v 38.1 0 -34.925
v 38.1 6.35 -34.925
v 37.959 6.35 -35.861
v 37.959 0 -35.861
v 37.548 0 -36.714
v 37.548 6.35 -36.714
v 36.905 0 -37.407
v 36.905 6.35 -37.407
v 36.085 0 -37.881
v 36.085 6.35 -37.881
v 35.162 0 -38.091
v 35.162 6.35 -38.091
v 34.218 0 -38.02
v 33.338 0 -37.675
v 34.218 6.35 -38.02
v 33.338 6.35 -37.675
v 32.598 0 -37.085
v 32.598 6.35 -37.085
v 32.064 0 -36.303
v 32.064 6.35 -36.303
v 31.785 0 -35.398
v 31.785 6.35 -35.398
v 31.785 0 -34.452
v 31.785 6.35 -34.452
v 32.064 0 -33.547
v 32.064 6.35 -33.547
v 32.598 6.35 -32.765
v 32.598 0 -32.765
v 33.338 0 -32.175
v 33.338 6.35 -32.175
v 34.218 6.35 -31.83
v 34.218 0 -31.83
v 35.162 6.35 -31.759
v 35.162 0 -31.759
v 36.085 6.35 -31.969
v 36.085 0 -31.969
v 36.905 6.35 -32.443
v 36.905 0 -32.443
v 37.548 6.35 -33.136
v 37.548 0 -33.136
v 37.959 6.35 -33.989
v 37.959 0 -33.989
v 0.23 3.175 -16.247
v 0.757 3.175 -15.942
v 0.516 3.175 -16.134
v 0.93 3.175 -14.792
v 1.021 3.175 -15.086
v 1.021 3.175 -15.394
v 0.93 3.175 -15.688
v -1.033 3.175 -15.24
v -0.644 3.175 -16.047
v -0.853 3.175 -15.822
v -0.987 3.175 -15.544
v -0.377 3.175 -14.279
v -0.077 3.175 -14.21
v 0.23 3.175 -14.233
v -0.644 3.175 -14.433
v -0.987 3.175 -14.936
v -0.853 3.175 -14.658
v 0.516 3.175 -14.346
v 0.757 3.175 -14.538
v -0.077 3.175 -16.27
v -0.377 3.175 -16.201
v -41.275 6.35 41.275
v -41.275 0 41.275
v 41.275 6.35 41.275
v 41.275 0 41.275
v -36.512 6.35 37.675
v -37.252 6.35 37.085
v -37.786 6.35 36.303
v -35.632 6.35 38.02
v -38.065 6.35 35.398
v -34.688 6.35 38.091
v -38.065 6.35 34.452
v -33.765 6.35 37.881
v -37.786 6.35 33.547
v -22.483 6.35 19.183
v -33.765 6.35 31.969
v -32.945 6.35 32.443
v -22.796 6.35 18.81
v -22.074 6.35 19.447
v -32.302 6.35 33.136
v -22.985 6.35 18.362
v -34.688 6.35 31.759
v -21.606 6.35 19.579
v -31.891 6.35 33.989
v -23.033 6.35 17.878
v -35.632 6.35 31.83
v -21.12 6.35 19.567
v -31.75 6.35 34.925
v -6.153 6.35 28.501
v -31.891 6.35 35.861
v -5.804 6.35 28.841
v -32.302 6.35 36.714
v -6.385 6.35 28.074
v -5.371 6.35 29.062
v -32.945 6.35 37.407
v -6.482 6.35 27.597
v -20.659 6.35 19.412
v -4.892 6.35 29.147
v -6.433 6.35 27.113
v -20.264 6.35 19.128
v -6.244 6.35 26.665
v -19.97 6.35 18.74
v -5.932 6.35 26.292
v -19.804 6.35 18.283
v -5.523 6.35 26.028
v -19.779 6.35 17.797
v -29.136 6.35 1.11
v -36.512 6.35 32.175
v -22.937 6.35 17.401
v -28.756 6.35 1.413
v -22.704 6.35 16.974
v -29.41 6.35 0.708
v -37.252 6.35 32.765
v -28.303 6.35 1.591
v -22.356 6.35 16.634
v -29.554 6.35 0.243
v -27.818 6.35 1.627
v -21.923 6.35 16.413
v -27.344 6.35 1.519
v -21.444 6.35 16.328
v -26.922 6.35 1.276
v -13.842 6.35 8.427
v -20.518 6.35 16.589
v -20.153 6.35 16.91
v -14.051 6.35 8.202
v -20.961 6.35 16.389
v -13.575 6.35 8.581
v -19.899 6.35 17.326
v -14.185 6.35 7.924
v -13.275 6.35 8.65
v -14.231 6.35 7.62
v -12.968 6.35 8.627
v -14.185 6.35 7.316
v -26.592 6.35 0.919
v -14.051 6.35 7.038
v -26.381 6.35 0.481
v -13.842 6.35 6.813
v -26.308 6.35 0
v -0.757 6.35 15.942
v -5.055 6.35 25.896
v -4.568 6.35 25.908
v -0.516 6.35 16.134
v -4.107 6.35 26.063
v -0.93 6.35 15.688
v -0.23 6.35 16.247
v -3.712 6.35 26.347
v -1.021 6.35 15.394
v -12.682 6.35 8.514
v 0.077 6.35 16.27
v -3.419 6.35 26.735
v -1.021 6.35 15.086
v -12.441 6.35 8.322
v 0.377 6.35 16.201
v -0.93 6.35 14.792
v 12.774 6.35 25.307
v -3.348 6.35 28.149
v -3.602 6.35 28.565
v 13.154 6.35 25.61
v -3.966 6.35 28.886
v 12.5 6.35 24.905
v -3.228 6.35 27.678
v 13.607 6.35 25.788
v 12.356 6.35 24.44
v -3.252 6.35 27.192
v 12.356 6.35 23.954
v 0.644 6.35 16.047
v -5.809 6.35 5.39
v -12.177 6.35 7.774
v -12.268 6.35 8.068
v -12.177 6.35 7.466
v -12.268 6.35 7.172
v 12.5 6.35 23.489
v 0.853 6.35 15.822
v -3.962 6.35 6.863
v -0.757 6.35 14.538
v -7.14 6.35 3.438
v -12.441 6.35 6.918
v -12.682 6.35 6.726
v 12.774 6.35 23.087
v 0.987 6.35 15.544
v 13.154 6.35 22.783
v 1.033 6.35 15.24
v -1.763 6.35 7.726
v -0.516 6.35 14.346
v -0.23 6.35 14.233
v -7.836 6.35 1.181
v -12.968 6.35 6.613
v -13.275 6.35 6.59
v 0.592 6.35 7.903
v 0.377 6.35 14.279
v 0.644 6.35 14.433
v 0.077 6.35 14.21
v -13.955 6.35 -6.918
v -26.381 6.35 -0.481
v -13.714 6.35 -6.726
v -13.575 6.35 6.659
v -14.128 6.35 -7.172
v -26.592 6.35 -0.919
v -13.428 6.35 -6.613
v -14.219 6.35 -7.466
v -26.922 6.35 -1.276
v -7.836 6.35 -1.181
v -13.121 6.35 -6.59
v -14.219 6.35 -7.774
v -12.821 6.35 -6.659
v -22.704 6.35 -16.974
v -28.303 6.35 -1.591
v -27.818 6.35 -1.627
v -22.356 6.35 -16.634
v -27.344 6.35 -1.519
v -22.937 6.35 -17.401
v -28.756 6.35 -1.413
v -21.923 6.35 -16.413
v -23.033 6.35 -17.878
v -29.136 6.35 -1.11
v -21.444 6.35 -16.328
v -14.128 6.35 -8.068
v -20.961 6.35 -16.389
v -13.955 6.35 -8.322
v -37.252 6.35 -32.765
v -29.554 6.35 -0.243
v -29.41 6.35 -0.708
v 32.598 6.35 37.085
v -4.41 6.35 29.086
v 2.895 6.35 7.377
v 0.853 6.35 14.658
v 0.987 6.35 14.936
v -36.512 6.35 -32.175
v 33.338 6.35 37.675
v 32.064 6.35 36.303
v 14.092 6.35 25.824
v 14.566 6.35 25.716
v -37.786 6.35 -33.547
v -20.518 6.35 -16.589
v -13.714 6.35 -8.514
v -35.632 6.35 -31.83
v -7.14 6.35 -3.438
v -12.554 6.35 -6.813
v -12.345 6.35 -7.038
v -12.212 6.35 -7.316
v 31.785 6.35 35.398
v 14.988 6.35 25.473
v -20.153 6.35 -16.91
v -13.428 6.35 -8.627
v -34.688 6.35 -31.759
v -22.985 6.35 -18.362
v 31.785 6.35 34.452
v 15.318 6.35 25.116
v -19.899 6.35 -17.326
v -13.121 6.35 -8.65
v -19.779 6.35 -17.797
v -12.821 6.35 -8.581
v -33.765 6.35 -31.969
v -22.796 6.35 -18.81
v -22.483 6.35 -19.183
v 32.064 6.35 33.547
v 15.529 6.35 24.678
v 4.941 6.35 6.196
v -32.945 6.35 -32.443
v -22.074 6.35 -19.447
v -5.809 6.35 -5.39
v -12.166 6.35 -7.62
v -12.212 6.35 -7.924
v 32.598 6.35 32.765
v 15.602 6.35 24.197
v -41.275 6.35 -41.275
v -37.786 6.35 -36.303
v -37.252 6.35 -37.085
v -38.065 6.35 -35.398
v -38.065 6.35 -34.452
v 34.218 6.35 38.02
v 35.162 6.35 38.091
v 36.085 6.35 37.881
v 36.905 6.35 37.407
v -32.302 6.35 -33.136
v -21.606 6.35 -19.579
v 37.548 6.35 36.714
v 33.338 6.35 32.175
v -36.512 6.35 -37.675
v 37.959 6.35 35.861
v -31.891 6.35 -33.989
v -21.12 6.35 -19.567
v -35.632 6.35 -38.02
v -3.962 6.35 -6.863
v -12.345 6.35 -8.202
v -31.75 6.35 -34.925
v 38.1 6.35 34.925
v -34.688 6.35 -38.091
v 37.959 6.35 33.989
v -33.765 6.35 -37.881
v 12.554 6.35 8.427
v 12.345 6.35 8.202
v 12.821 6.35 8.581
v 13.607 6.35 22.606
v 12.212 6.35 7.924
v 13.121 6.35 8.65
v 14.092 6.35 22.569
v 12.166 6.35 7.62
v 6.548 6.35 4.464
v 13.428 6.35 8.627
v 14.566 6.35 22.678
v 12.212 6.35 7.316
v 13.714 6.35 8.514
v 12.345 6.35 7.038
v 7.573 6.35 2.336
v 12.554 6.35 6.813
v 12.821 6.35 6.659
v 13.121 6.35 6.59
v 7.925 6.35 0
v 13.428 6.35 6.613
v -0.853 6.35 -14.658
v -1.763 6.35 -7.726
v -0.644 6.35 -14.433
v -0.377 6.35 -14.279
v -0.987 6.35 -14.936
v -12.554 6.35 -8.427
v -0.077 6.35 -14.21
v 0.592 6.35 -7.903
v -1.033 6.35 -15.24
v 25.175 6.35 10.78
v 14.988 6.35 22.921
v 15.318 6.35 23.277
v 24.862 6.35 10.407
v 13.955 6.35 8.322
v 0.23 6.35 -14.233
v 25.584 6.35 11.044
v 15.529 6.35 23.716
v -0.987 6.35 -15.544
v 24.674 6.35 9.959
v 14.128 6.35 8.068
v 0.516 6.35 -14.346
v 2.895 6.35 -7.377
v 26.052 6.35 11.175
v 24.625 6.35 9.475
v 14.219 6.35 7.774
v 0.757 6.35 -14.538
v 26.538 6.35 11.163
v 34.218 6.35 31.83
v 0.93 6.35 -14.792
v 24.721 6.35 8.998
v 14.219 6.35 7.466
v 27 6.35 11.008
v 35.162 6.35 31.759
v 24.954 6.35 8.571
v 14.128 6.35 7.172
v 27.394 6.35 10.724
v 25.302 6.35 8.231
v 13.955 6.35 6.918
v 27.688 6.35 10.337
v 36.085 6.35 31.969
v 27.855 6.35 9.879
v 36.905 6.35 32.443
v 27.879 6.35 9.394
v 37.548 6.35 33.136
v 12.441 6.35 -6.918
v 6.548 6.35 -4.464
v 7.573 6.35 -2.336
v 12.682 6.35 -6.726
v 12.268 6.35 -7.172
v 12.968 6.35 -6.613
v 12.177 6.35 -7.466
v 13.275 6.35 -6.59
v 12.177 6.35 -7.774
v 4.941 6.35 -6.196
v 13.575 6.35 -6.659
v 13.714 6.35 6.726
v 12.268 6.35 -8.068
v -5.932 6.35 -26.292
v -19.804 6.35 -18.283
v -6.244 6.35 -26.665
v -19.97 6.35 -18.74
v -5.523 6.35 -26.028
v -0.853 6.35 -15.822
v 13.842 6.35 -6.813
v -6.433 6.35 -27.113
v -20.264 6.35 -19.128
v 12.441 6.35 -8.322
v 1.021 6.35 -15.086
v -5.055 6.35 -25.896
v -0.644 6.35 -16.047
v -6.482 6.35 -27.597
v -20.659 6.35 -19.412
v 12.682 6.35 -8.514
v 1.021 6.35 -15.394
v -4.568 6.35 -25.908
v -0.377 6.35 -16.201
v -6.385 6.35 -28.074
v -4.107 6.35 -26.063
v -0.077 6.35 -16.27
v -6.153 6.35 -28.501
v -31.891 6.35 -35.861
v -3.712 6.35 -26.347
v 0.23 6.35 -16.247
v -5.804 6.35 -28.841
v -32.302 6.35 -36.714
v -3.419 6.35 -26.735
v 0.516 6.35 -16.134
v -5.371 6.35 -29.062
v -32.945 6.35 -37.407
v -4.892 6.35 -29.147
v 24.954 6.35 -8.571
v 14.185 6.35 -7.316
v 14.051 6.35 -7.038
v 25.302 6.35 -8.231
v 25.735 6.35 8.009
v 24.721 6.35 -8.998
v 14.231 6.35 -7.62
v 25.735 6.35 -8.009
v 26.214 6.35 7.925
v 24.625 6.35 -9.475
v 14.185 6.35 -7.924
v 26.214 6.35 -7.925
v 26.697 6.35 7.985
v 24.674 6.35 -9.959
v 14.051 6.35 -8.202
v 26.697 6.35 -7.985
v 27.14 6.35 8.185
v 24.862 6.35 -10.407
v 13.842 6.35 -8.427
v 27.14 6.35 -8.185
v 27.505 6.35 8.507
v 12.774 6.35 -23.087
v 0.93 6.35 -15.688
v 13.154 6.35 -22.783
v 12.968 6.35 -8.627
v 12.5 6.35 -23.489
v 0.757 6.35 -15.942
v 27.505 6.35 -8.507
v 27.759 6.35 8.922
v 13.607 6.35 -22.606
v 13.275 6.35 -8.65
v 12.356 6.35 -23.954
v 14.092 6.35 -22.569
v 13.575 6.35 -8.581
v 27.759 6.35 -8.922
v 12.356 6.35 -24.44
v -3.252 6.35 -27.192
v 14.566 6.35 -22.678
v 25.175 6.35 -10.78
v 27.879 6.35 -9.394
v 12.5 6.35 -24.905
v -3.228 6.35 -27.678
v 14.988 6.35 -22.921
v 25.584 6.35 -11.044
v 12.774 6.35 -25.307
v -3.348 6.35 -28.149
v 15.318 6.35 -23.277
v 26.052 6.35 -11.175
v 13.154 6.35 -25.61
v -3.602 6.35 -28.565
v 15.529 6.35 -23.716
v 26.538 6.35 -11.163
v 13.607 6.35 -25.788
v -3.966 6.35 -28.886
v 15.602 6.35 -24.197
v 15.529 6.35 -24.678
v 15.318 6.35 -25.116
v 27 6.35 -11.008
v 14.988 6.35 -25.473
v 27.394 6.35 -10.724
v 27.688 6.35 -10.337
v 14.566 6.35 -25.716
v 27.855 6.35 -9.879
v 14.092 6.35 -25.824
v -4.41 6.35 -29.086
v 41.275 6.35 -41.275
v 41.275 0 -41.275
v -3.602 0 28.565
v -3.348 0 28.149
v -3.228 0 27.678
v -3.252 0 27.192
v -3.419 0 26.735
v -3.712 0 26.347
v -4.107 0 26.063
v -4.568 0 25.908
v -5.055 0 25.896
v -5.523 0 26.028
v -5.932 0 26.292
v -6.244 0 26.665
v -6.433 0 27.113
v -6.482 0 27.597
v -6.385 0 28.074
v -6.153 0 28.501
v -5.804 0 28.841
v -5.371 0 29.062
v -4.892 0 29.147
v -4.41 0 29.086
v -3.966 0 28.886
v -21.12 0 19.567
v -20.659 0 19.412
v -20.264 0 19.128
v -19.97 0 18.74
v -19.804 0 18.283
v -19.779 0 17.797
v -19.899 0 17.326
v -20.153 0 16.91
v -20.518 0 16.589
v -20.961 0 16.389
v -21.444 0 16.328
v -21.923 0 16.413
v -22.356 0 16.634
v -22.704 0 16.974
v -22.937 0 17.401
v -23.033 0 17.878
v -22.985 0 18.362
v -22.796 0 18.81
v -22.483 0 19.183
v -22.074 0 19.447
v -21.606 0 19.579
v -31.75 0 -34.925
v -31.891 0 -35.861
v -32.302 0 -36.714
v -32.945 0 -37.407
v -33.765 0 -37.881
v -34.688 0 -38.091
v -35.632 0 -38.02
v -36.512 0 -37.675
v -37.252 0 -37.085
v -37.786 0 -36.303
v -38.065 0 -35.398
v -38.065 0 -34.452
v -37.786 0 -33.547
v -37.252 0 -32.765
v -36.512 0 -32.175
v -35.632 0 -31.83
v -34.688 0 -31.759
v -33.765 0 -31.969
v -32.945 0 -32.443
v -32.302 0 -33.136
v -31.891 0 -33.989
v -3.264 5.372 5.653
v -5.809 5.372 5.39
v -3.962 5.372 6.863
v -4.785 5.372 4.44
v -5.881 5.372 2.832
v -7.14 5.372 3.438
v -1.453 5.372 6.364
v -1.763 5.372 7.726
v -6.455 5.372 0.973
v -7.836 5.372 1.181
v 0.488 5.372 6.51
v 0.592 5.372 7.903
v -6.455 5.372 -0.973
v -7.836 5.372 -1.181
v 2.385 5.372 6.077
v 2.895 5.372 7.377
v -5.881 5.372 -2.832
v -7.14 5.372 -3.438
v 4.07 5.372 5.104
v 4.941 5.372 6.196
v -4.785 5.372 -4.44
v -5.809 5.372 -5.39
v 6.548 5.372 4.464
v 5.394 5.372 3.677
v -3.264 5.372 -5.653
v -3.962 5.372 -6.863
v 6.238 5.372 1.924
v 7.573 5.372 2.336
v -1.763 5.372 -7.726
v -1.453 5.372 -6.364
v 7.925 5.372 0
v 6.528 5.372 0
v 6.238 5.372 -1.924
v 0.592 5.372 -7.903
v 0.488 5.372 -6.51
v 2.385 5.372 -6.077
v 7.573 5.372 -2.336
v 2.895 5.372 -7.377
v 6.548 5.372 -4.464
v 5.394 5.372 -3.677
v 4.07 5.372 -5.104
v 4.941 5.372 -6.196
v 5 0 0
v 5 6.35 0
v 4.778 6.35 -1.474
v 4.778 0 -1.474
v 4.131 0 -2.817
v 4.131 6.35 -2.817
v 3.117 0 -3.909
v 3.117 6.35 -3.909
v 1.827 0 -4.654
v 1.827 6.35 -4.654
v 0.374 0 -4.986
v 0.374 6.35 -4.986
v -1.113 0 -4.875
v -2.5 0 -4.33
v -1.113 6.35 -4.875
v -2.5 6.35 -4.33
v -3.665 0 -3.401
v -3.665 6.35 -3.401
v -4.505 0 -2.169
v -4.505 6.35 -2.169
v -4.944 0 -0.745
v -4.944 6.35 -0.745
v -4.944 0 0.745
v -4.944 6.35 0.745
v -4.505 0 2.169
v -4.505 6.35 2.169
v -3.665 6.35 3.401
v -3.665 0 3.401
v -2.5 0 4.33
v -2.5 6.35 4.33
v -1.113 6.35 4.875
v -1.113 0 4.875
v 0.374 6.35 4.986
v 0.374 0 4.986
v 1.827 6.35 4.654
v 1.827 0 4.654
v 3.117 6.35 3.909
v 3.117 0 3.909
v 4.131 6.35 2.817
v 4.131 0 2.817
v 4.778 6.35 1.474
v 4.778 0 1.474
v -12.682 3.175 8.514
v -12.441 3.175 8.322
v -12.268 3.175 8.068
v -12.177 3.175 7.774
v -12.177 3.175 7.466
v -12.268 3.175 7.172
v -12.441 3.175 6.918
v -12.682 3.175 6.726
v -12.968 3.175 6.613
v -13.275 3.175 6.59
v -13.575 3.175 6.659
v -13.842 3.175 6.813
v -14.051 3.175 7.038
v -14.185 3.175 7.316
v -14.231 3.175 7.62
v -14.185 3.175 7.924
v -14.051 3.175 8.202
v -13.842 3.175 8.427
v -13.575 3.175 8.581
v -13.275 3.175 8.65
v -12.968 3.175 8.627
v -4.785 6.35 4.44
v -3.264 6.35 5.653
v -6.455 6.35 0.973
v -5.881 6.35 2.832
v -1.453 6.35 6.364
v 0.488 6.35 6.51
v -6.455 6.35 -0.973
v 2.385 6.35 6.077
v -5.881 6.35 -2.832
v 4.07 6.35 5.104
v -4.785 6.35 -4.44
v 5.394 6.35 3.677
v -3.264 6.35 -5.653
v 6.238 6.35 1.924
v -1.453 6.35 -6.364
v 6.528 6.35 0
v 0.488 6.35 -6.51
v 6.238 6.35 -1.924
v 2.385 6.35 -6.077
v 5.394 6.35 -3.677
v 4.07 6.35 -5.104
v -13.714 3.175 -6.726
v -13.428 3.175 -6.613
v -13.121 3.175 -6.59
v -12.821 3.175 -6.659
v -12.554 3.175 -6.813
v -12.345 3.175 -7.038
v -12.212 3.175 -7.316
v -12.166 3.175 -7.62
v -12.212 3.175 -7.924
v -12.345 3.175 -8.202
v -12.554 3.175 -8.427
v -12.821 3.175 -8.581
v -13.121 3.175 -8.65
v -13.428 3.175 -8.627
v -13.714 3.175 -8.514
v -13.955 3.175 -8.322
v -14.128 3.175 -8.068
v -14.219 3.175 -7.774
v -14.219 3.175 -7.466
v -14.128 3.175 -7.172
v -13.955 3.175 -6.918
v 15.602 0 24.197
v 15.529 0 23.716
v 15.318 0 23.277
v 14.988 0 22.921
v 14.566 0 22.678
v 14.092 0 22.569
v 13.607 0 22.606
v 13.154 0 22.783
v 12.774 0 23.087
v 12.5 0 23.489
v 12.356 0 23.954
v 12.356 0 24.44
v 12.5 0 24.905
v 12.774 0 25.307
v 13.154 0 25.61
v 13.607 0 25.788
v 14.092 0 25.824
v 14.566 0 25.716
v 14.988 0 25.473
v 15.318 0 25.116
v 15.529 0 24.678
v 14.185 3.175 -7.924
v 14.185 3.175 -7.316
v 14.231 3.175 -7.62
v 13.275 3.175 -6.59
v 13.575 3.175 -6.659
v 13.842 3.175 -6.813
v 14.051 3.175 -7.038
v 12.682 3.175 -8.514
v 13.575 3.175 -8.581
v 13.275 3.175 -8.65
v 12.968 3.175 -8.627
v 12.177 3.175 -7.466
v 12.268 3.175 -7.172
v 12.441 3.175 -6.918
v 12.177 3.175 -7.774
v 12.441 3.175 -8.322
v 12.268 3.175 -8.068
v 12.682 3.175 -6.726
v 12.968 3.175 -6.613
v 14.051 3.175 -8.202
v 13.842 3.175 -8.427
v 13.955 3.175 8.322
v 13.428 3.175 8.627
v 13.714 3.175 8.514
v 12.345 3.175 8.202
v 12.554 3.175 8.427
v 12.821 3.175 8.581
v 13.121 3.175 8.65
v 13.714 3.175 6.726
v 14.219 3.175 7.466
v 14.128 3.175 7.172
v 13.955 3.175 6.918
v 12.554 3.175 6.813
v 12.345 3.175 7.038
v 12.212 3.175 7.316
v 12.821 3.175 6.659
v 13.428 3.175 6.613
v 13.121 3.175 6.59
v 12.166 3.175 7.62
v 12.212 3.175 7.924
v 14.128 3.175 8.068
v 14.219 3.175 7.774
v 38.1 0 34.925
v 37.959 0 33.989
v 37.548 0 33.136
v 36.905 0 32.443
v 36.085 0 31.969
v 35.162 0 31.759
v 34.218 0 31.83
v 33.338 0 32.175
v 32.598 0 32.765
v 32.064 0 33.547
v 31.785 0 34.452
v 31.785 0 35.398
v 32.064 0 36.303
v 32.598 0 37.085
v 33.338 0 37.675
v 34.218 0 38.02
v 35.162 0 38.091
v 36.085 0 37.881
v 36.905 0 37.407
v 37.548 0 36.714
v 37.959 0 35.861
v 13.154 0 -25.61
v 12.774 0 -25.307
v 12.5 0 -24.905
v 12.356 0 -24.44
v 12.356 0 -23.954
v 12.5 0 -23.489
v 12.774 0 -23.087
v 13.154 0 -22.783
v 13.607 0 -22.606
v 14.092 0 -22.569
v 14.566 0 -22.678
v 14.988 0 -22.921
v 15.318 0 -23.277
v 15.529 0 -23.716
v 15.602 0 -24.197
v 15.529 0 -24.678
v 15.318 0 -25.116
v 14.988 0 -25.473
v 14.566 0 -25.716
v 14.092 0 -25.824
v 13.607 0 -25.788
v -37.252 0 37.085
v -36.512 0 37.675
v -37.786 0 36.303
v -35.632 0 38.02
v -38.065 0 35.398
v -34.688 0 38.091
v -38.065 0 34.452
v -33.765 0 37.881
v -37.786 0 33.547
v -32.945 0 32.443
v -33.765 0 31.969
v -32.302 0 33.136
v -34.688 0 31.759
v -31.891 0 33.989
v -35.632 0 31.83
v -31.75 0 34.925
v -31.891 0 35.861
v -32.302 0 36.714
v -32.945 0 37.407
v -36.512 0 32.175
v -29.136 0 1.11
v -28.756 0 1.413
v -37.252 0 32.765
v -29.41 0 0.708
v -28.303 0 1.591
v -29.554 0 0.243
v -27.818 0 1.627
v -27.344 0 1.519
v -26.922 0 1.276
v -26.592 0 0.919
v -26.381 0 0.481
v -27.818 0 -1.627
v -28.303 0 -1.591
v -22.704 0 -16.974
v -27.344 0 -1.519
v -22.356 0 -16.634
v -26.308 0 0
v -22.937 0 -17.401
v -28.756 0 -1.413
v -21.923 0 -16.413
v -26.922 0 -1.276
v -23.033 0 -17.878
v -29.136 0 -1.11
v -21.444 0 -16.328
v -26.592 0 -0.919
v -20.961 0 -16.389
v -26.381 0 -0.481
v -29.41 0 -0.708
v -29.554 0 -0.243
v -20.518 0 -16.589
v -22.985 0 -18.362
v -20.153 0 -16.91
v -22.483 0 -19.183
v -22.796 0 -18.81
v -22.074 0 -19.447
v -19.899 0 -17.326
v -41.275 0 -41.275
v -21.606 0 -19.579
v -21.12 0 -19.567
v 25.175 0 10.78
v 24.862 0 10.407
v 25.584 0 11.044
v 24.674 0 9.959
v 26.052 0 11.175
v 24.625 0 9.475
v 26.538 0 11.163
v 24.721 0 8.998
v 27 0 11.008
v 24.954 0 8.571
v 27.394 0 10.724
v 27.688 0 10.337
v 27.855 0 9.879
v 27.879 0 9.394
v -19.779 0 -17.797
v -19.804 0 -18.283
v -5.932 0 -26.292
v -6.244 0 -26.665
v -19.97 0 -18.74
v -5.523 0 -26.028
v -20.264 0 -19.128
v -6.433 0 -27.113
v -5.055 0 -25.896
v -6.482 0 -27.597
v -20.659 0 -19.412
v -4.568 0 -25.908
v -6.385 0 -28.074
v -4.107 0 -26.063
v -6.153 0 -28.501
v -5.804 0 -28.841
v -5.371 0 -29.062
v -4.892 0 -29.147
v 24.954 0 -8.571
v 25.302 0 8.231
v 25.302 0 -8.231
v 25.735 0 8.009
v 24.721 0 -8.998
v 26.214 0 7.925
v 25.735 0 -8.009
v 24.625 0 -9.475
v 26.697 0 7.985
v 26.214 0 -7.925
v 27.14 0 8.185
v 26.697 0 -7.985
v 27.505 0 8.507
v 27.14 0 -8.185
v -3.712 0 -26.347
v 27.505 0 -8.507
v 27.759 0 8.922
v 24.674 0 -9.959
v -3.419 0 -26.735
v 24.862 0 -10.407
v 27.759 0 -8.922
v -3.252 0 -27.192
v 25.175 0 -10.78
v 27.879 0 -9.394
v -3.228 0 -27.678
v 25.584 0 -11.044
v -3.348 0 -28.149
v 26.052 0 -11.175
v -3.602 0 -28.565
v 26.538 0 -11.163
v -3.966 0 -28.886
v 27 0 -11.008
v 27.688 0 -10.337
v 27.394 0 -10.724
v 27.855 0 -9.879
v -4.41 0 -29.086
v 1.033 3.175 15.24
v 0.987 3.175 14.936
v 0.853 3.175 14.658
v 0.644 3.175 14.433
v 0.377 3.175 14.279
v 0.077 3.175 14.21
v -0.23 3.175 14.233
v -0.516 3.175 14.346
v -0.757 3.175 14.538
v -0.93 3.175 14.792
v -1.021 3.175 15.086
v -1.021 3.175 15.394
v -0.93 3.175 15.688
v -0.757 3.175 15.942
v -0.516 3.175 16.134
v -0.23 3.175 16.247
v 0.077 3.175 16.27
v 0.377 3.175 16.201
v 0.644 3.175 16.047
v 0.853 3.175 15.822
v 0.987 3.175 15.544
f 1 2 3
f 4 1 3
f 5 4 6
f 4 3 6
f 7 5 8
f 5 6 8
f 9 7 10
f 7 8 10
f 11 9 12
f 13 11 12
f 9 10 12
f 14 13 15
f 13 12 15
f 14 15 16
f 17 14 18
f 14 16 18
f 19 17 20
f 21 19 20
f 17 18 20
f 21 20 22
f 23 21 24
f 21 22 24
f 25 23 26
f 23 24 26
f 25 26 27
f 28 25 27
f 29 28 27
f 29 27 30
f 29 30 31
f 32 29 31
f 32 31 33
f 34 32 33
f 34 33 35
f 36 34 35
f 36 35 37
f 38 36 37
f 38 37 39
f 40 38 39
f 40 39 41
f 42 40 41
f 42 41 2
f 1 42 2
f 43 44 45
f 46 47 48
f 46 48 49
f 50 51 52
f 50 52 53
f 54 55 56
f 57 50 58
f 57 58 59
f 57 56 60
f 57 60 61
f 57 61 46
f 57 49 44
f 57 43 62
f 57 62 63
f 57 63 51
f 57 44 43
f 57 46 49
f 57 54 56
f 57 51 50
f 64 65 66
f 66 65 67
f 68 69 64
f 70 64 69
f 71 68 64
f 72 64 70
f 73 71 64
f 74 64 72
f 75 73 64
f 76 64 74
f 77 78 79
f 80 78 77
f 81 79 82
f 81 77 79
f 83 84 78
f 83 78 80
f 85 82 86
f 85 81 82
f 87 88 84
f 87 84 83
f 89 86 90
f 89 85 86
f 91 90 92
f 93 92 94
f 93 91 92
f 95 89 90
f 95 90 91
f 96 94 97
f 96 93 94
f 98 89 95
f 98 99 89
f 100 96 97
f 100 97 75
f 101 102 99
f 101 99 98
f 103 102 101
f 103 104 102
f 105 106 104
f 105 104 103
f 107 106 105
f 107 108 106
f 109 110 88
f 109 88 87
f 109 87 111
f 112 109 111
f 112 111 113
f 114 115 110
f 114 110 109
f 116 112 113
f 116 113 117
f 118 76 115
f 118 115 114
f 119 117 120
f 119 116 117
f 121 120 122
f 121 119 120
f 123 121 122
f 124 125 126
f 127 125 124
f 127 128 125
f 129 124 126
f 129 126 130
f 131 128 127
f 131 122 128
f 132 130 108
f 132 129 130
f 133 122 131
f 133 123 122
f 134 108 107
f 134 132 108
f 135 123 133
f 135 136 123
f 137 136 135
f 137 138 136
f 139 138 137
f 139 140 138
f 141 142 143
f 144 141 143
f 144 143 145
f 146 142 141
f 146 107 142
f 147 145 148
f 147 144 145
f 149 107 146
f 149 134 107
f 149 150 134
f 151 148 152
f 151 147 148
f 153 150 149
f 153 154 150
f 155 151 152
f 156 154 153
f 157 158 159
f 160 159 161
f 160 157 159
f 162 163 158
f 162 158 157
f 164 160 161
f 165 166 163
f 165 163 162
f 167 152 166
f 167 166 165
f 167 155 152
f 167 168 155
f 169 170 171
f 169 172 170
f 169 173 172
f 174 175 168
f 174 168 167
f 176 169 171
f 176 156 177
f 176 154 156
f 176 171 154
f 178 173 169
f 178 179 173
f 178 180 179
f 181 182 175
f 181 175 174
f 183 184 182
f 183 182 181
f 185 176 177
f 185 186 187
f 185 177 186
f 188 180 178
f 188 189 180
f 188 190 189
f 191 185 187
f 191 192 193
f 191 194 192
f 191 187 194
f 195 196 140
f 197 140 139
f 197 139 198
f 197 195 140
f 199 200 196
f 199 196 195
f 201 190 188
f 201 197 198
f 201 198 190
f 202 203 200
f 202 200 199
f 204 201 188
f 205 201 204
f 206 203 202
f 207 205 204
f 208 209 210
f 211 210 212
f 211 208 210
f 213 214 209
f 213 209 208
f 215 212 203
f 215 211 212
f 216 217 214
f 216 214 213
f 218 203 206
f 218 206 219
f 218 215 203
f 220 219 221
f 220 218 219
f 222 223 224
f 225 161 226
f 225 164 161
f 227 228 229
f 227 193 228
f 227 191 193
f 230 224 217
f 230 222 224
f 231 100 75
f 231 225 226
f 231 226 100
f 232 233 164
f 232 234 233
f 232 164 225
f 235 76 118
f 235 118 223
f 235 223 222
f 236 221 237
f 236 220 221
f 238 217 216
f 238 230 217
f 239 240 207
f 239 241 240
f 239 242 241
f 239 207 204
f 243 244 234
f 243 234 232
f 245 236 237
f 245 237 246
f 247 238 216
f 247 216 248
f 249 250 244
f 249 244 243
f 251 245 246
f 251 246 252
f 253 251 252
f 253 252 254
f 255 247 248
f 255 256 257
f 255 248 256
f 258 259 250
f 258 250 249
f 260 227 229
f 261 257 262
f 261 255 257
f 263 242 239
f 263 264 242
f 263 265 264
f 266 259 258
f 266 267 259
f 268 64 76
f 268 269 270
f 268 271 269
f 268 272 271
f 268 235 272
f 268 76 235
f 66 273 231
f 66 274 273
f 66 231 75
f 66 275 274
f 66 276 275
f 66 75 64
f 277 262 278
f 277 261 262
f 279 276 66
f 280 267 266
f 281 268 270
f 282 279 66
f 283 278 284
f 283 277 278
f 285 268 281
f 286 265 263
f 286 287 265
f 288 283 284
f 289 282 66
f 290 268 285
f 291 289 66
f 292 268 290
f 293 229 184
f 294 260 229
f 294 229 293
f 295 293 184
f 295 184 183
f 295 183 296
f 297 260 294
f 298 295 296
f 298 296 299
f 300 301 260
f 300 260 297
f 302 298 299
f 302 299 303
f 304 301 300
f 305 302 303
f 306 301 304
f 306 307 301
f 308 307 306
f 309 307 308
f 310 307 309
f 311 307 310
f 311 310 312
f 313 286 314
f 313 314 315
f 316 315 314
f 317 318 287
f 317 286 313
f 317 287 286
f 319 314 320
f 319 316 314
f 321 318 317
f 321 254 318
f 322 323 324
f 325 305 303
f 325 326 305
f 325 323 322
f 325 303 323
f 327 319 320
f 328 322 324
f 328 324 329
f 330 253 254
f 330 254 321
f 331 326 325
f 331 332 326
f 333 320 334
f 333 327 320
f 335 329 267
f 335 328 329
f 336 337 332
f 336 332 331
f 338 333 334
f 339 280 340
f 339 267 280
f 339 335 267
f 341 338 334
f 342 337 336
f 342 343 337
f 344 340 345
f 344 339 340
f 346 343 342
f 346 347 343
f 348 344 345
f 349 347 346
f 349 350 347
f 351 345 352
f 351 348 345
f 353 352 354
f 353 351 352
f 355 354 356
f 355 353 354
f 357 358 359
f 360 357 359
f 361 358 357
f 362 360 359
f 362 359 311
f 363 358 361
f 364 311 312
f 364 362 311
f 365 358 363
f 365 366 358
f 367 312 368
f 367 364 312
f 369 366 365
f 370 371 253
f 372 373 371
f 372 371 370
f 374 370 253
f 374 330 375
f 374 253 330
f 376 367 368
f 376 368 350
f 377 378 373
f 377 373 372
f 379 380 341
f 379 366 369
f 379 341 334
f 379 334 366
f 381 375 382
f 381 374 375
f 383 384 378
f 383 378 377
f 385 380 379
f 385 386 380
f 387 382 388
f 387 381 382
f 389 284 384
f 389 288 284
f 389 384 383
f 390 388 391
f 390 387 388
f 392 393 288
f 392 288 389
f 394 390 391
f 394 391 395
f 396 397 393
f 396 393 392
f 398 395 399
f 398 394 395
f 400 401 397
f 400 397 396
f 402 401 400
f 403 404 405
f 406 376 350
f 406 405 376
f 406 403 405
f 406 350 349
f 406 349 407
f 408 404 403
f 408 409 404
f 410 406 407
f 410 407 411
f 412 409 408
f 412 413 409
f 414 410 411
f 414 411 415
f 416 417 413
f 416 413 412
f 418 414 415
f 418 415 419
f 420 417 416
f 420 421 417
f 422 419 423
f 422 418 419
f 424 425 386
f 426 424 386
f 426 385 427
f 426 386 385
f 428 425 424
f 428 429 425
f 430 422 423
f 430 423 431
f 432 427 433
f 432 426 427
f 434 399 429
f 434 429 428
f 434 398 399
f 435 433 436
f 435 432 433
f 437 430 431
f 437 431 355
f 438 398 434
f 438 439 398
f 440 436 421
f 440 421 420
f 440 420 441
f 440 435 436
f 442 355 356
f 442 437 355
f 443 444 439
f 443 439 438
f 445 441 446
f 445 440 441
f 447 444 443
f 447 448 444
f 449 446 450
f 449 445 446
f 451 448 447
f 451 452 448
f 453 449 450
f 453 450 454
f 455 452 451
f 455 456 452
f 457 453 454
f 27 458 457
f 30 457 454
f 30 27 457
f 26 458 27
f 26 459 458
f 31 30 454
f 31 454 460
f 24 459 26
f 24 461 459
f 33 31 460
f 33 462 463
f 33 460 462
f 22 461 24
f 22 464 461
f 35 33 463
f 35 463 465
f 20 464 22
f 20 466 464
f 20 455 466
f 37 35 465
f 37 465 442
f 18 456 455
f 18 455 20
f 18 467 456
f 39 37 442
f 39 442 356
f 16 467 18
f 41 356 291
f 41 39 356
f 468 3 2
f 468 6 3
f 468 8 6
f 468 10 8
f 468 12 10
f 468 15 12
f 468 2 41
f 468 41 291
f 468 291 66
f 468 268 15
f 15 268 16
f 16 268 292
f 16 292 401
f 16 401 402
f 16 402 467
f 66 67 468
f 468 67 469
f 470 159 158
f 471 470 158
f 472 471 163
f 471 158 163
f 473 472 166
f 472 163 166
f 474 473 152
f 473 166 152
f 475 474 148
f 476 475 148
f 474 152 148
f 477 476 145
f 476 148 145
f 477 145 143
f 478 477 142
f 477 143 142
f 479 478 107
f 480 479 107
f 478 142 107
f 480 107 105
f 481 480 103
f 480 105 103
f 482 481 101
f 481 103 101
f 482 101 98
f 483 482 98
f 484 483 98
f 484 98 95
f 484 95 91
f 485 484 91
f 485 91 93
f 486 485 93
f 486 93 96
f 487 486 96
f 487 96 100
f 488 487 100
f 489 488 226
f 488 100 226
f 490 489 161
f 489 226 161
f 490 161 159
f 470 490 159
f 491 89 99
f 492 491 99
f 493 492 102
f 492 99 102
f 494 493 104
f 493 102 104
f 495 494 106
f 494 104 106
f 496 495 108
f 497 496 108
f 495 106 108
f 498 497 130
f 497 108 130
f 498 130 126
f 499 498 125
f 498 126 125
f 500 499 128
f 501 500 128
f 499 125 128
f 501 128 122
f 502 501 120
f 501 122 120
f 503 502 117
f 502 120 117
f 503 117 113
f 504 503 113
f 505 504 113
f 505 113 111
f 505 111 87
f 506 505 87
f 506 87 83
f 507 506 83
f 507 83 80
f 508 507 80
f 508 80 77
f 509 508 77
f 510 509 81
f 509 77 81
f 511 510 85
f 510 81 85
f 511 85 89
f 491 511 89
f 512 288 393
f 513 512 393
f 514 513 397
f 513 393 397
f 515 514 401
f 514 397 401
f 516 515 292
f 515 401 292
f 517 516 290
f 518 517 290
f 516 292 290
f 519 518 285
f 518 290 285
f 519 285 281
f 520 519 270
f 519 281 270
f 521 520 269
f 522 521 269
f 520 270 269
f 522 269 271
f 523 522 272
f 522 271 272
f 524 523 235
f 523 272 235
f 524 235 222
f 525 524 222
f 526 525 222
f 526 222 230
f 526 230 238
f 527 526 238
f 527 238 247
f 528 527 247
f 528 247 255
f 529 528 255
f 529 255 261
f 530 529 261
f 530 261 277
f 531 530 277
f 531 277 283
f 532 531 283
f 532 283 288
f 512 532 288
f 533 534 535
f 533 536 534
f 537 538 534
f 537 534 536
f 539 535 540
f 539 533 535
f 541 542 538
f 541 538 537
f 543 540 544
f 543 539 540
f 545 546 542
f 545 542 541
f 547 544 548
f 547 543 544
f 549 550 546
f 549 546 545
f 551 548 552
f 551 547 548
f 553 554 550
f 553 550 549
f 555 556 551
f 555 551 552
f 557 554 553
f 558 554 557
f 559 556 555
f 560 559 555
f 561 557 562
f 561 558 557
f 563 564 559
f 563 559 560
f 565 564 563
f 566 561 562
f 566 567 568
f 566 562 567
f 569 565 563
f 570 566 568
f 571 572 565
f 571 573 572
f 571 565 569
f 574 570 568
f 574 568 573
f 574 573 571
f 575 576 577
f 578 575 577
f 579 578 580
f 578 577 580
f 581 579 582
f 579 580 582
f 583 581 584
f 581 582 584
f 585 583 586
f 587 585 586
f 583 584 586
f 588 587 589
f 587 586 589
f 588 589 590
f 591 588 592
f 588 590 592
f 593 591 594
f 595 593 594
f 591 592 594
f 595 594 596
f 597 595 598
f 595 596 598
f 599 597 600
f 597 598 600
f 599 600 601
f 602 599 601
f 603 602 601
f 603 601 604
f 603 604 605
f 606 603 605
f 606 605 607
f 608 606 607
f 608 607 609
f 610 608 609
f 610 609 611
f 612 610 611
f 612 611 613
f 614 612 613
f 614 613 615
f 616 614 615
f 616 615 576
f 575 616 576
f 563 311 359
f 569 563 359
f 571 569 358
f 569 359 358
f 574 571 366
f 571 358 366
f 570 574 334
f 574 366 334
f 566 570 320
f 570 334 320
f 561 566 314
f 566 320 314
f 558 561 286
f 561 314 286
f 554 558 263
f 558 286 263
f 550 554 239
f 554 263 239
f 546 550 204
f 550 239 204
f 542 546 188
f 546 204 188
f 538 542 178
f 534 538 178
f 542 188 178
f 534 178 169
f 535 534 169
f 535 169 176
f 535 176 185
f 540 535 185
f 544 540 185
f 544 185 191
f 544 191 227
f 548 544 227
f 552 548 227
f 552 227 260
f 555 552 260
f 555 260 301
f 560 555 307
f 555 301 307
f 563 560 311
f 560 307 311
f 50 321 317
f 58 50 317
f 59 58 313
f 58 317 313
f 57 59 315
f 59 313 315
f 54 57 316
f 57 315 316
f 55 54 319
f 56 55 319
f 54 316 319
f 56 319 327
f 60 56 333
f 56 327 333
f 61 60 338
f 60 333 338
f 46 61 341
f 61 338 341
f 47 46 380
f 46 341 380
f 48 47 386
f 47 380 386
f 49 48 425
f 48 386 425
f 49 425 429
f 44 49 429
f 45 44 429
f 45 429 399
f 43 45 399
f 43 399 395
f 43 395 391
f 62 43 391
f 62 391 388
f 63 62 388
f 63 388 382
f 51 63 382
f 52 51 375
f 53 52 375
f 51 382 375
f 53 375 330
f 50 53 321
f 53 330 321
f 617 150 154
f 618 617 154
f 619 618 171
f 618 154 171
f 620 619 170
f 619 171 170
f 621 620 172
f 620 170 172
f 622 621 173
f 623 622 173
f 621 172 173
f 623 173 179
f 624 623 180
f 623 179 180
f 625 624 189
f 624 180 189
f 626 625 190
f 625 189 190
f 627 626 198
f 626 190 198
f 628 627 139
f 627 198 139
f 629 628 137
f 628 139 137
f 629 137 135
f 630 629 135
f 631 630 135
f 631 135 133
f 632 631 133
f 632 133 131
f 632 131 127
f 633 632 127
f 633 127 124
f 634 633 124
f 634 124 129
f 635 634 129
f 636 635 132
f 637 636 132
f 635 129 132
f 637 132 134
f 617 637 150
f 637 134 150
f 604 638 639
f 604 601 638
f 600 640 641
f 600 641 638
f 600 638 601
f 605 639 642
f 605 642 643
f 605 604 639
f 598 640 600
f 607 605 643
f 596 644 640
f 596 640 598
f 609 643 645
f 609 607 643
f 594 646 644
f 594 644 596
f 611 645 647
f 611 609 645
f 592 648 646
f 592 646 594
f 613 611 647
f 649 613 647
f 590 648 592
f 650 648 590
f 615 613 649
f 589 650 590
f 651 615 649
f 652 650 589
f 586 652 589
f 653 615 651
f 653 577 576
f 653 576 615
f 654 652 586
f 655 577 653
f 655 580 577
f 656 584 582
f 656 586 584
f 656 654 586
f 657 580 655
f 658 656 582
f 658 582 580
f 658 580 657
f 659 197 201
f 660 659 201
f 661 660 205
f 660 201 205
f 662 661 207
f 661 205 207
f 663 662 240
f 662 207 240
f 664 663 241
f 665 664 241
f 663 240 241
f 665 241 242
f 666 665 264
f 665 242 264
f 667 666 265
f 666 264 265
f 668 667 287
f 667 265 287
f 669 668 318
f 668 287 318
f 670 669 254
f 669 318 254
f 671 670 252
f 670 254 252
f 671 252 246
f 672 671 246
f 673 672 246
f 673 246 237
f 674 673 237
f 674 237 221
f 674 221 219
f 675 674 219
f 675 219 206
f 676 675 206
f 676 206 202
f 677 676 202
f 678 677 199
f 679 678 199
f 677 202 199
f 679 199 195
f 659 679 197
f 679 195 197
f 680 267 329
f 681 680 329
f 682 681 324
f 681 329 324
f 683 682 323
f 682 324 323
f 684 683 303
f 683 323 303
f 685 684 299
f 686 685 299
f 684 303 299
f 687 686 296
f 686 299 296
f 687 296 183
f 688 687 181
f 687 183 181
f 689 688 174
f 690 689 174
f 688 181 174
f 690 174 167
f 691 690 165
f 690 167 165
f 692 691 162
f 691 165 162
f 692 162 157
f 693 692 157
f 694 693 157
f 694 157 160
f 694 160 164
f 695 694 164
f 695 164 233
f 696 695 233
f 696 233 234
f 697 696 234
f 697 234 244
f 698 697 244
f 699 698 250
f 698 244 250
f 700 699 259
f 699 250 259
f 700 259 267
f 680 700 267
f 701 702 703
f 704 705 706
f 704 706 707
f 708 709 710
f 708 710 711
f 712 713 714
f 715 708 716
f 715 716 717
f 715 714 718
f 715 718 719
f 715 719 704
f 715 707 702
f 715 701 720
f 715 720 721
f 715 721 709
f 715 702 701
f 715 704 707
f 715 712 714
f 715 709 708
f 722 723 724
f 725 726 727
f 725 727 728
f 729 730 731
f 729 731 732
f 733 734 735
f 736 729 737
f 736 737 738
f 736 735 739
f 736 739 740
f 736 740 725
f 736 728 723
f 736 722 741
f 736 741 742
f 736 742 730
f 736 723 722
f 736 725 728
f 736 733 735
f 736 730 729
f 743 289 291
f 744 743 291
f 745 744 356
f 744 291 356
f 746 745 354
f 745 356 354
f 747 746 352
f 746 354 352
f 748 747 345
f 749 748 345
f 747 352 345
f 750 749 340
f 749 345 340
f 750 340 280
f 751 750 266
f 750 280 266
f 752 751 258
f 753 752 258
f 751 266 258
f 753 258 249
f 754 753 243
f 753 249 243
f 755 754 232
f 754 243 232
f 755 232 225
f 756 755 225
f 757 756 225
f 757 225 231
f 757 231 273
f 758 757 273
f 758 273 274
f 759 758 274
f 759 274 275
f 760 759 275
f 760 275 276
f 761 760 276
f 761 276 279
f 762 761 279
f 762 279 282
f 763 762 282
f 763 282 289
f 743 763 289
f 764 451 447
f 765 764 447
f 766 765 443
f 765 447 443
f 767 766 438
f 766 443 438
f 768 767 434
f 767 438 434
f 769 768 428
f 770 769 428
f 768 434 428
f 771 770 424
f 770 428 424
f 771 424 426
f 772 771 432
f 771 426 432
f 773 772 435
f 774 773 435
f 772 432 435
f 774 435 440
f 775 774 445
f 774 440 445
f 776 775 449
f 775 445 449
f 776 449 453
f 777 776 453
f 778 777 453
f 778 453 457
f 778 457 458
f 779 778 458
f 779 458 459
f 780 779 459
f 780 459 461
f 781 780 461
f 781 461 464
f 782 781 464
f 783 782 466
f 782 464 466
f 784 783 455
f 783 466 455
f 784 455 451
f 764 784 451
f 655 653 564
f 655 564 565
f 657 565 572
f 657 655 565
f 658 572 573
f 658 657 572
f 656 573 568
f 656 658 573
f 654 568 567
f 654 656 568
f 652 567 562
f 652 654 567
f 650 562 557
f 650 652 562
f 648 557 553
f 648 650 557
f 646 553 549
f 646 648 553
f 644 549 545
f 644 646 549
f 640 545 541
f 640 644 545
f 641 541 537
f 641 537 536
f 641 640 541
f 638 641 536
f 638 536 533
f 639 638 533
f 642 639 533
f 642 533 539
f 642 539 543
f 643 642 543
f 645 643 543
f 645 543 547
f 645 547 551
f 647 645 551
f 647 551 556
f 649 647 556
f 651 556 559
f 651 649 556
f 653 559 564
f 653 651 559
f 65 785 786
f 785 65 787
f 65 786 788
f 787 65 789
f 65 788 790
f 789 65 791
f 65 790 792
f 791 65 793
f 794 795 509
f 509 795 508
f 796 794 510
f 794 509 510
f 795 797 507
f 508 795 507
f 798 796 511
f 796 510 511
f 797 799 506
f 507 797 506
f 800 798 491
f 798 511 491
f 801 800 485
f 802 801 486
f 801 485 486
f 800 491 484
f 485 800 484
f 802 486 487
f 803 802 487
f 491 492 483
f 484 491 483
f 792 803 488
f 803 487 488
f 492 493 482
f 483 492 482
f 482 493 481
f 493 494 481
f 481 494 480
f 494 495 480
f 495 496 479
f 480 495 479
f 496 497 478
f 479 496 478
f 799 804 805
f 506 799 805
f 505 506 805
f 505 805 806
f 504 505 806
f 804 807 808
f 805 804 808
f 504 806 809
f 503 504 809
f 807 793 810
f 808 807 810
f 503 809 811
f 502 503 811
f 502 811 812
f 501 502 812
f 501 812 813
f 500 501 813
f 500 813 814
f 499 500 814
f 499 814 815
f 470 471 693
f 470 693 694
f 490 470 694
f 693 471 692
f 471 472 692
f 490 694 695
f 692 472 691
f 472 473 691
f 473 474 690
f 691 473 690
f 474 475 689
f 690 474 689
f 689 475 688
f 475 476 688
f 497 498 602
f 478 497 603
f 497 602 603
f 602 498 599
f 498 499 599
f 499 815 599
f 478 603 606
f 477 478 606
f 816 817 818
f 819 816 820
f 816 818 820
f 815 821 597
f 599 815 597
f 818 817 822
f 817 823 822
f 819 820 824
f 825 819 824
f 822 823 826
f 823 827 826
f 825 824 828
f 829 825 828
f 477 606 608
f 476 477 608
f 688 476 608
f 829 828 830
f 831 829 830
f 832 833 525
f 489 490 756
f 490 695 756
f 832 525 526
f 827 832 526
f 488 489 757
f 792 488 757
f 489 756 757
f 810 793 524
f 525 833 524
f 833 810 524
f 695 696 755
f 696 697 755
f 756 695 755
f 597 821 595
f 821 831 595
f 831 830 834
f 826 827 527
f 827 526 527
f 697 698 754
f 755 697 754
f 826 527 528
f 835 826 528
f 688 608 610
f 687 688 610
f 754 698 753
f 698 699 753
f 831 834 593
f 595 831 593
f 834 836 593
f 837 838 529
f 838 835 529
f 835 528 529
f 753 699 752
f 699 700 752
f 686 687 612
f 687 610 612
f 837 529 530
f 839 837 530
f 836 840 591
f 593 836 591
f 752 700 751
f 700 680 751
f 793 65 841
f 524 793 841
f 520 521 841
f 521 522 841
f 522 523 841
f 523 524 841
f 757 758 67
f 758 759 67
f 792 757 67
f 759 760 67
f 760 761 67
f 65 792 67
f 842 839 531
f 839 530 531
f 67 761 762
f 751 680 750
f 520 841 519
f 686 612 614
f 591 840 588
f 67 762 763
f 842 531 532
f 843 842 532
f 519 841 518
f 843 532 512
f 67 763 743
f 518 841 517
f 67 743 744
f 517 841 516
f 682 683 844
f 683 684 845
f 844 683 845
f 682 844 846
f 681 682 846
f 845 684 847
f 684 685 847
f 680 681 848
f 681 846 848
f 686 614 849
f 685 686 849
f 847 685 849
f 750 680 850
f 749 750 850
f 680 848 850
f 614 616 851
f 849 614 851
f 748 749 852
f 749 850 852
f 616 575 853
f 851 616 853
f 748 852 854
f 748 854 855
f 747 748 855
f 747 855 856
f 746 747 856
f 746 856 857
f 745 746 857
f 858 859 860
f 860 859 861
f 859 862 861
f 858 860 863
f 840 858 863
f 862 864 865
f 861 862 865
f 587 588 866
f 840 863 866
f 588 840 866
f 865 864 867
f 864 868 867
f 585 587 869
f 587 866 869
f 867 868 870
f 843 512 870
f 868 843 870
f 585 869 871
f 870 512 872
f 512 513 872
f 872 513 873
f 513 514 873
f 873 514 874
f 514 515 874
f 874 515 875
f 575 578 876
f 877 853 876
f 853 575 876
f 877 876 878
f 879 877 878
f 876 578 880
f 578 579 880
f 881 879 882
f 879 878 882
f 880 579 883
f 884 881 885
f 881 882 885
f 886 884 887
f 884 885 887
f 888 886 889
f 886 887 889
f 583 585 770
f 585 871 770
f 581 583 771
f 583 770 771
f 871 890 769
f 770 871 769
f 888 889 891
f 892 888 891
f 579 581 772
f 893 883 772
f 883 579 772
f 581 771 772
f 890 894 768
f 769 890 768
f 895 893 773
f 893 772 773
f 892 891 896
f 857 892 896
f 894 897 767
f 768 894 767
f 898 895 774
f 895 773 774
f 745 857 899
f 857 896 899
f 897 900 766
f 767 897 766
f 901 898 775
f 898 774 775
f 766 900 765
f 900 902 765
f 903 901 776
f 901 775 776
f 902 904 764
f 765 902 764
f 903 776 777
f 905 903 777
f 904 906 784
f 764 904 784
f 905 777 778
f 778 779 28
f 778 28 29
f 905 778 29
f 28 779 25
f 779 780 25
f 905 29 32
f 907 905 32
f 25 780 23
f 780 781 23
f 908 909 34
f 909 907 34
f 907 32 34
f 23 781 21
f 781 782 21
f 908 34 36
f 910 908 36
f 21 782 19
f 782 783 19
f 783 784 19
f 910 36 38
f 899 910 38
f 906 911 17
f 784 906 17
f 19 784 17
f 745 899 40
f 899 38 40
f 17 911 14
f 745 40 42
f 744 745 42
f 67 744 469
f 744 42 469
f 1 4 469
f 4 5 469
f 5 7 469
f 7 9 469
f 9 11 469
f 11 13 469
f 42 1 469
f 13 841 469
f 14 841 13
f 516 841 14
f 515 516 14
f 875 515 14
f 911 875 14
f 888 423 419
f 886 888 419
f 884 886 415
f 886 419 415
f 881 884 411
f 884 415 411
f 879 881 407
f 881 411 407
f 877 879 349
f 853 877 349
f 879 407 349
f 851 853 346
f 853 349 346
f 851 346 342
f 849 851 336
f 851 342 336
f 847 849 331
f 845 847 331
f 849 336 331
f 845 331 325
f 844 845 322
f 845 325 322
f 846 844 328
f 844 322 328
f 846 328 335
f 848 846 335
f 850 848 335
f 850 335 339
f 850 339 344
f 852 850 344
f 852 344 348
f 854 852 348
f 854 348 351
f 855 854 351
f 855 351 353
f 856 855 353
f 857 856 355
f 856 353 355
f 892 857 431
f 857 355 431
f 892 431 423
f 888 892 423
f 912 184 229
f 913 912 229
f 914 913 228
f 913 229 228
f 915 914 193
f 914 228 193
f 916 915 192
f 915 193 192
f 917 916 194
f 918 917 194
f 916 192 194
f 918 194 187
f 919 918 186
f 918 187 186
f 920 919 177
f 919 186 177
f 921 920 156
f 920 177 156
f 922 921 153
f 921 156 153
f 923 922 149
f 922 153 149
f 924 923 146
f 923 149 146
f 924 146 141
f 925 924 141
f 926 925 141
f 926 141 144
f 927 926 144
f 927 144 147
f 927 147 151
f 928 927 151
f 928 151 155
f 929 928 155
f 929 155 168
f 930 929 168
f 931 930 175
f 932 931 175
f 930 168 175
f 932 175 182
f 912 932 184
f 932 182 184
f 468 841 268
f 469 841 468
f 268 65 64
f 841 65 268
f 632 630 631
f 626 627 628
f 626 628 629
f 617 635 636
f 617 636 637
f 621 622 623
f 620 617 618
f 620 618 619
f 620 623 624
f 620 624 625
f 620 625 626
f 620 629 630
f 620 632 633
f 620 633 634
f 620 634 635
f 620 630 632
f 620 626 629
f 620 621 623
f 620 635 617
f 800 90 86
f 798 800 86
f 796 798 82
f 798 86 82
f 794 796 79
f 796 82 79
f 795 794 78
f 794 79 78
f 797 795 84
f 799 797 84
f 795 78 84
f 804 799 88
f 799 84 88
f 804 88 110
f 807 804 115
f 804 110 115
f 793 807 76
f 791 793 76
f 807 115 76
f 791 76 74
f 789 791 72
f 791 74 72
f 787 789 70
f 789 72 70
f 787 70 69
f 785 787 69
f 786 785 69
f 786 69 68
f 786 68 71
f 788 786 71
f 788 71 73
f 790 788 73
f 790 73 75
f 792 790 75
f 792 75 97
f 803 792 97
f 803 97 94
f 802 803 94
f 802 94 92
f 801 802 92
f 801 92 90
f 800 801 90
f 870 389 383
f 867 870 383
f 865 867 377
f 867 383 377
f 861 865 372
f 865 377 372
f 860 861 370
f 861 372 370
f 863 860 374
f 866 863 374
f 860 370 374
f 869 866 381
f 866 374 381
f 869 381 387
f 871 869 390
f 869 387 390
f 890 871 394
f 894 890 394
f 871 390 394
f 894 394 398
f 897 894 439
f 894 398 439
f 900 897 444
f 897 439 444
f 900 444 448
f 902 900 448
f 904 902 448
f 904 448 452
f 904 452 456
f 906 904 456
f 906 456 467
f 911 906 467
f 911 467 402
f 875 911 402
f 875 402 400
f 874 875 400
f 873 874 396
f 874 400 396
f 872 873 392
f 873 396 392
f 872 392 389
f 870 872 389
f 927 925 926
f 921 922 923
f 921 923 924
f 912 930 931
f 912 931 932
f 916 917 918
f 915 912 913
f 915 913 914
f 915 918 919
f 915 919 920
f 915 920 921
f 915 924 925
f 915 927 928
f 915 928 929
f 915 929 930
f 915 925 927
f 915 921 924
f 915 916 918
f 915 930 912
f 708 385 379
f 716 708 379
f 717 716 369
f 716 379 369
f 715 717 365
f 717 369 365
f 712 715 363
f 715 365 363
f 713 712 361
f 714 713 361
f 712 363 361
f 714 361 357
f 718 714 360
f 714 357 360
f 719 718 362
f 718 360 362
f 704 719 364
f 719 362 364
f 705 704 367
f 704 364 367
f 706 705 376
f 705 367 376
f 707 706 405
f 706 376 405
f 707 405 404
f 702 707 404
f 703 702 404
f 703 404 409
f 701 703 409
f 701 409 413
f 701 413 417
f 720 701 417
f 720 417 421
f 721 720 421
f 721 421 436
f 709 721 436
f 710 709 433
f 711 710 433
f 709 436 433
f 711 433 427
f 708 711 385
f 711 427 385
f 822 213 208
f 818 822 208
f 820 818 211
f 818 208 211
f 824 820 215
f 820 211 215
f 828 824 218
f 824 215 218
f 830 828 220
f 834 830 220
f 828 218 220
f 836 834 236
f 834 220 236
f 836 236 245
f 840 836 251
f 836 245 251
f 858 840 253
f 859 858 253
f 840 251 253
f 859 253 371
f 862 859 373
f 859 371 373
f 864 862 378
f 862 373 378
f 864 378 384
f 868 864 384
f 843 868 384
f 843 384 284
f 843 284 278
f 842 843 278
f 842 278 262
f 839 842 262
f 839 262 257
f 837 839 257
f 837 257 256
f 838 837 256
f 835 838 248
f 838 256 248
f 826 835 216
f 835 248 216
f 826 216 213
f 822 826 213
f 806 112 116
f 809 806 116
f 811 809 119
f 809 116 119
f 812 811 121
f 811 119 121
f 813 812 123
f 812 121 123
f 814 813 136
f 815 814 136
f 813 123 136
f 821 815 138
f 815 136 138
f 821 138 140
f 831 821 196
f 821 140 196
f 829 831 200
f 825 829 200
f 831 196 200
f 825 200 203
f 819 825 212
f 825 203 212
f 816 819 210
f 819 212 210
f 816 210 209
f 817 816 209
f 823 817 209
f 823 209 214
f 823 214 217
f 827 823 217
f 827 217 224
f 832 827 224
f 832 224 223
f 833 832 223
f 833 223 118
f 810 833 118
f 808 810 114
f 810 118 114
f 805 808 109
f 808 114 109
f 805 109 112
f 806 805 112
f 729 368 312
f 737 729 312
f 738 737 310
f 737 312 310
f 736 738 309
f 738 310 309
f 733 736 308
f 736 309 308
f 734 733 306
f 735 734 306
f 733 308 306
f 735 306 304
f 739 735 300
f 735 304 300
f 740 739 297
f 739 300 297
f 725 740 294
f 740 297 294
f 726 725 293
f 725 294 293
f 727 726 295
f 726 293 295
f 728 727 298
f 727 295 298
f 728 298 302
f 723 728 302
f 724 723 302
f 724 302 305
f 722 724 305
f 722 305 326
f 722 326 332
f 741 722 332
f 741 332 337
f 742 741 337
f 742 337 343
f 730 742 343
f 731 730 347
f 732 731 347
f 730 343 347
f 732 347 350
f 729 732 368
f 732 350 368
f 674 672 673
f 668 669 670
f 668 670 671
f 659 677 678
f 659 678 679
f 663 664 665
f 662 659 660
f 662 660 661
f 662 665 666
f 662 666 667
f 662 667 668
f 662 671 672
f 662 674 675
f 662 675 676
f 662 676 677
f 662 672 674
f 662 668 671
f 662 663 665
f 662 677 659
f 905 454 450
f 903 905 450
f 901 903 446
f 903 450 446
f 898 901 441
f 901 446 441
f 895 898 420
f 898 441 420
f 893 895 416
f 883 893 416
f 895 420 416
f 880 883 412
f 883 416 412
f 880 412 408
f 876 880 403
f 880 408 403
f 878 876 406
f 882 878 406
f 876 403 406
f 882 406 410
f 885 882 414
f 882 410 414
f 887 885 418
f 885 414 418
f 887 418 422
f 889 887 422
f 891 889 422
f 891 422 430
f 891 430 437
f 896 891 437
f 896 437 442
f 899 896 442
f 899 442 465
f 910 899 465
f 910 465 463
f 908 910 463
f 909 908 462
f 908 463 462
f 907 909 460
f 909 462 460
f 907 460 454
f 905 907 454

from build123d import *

# Parameters (mm, degrees)
SKETCH1_W           = 82.55
SKETCH1_H           = 82.55
BOSS_EXTRUDE1_DEPTH = 6.35
CUT_EXTRUDE1_REACH  = 8.35
SKETCH2_R           = 4.99999
SKETCH4_R           = 7.9248
SKETCH4_R_2         = 6.5278
CUT_EXTRUDE3_DEPTH  = 0.9779
SKETCH5_R           = 1.03251
CUT_EXTRUDE4_DEPTH  = 3.175
CIRPATTERN1_COUNT   = 6
SKETCH6_R           = 1.63195
CUT_EXTRUDE5_DEPTH  = 6.35
CIRPATTERN2_COUNT   = 9
CUT_EXTRUDE6_REACH  = 8.35
SKETCH7_R           = 3.175


with BuildPart() as part:
    # Sketch1 → Boss-Extrude1 (new body)
    with BuildSketch(Plane(origin=(0, 0, 0), x_dir=(1, 0, 0), z_dir=(0, 1, 0))):
        Rectangle(SKETCH1_W, SKETCH1_H)
    extrude(amount=BOSS_EXTRUDE1_DEPTH)

    # Sketch2 → Cut-Extrude1 (cut, up to next)
    with BuildSketch(Plane(origin=(0, 6.35, 0), x_dir=(1, 0, 0), z_dir=(0, 1, 0)), mode=Mode.PRIVATE) as cut_extrude1_sk1:
        Circle(SKETCH2_R)
    cut_extrude1_tool1 = extrude(cut_extrude1_sk1.sketch, amount=-CUT_EXTRUDE1_REACH, mode=Mode.PRIVATE) & part.part
    add(cut_extrude1_tool1.solids().sort_by_distance((0, 6.35, 0))[0], mode=Mode.SUBTRACT)

    # Sketch4 → Cut-Extrude3 (cut)
    with BuildSketch(Plane(origin=(0, 6.35, 0), x_dir=(1, 0, 0), z_dir=(0, 1, 0))):
        Circle(SKETCH4_R)
        Circle(SKETCH4_R_2, mode=Mode.SUBTRACT)
    extrude(amount=-CUT_EXTRUDE3_DEPTH, mode=Mode.SUBTRACT)

    # Sketch5 → Cut-Extrude4 (cut)
    with BuildSketch(Plane(origin=(0, 6.35, 0), x_dir=(1, 0, 0), z_dir=(0, 1, 0))):
        with Locations((0, -15.24)):
            Circle(SKETCH5_R)
    cut_extrude4 = extrude(amount=-CUT_EXTRUDE4_DEPTH, mode=Mode.SUBTRACT)

    # CirPattern1: Cut-Extrude4 ×6 about axis
    cirpattern1_axis = Axis((0, 0, 0), (0, 1, 0))
    for i in range(1, CIRPATTERN1_COUNT):
        add(cut_extrude4.rotate(cirpattern1_axis, i * 360 / CIRPATTERN1_COUNT), mode=Mode.SUBTRACT)

    # Sketch6 → Cut-Extrude5 (cut)
    with BuildSketch(Plane(origin=(0, 6.35, 0), x_dir=(1, 0, 0), z_dir=(0, 1, 0))):
        with Locations((13.97, -24.196749782)):
            Circle(SKETCH6_R)
    cut_extrude5 = extrude(amount=-CUT_EXTRUDE5_DEPTH, mode=Mode.SUBTRACT)

    # CirPattern2: Cut-Extrude5 ×9 about axis
    cirpattern2_axis = Axis((0, 0, 0), (0, 1, 0))
    for i in range(1, CIRPATTERN2_COUNT):
        add(cut_extrude5.rotate(cirpattern2_axis, i * 360 / CIRPATTERN2_COUNT), mode=Mode.SUBTRACT)

    # Sketch7 → Cut-Extrude6 (cut, up to next)
    with BuildSketch(Plane(origin=(0, 6.35, 0), x_dir=(1, 0, 0), z_dir=(0, 1, 0)), mode=Mode.PRIVATE) as cut_extrude6_sk1:
        with Locations((34.925, 34.925)):
            Circle(SKETCH7_R)
    cut_extrude6_tool1 = extrude(cut_extrude6_sk1.sketch, amount=-CUT_EXTRUDE6_REACH, mode=Mode.PRIVATE) & part.part
    add(cut_extrude6_tool1.solids().sort_by_distance((34.925, 6.35, -34.925))[0], mode=Mode.SUBTRACT)
    # Sketch7 → Cut-Extrude6 (cut, up to next)
    with BuildSketch(Plane(origin=(0, 6.35, 0), x_dir=(1, 0, 0), z_dir=(0, 1, 0)), mode=Mode.PRIVATE) as cut_extrude6_sk2:
        with Locations((34.925, -34.925)):
            Circle(SKETCH7_R)
    cut_extrude6_tool2 = extrude(cut_extrude6_sk2.sketch, amount=-CUT_EXTRUDE6_REACH, mode=Mode.PRIVATE) & part.part
    add(cut_extrude6_tool2.solids().sort_by_distance((34.925, 6.35, 34.925))[0], mode=Mode.SUBTRACT)
    # Sketch7 → Cut-Extrude6 (cut, up to next)
    with BuildSketch(Plane(origin=(0, 6.35, 0), x_dir=(1, 0, 0), z_dir=(0, 1, 0)), mode=Mode.PRIVATE) as cut_extrude6_sk3:
        with Locations((-34.925, -34.925)):
            Circle(SKETCH7_R)
    cut_extrude6_tool3 = extrude(cut_extrude6_sk3.sketch, amount=-CUT_EXTRUDE6_REACH, mode=Mode.PRIVATE) & part.part
    add(cut_extrude6_tool3.solids().sort_by_distance((-34.925, 6.35, 34.925))[0], mode=Mode.SUBTRACT)
    # Sketch7 → Cut-Extrude6 (cut, up to next)
    with BuildSketch(Plane(origin=(0, 6.35, 0), x_dir=(1, 0, 0), z_dir=(0, 1, 0)), mode=Mode.PRIVATE) as cut_extrude6_sk4:
        with Locations((-34.925, 34.925)):
            Circle(SKETCH7_R)
    cut_extrude6_tool4 = extrude(cut_extrude6_sk4.sketch, amount=-CUT_EXTRUDE6_REACH, mode=Mode.PRIVATE) & part.part
    add(cut_extrude6_tool4.solids().sort_by_distance((-34.925, 6.35, -34.925))[0], mode=Mode.SUBTRACT)


solid = part.part
